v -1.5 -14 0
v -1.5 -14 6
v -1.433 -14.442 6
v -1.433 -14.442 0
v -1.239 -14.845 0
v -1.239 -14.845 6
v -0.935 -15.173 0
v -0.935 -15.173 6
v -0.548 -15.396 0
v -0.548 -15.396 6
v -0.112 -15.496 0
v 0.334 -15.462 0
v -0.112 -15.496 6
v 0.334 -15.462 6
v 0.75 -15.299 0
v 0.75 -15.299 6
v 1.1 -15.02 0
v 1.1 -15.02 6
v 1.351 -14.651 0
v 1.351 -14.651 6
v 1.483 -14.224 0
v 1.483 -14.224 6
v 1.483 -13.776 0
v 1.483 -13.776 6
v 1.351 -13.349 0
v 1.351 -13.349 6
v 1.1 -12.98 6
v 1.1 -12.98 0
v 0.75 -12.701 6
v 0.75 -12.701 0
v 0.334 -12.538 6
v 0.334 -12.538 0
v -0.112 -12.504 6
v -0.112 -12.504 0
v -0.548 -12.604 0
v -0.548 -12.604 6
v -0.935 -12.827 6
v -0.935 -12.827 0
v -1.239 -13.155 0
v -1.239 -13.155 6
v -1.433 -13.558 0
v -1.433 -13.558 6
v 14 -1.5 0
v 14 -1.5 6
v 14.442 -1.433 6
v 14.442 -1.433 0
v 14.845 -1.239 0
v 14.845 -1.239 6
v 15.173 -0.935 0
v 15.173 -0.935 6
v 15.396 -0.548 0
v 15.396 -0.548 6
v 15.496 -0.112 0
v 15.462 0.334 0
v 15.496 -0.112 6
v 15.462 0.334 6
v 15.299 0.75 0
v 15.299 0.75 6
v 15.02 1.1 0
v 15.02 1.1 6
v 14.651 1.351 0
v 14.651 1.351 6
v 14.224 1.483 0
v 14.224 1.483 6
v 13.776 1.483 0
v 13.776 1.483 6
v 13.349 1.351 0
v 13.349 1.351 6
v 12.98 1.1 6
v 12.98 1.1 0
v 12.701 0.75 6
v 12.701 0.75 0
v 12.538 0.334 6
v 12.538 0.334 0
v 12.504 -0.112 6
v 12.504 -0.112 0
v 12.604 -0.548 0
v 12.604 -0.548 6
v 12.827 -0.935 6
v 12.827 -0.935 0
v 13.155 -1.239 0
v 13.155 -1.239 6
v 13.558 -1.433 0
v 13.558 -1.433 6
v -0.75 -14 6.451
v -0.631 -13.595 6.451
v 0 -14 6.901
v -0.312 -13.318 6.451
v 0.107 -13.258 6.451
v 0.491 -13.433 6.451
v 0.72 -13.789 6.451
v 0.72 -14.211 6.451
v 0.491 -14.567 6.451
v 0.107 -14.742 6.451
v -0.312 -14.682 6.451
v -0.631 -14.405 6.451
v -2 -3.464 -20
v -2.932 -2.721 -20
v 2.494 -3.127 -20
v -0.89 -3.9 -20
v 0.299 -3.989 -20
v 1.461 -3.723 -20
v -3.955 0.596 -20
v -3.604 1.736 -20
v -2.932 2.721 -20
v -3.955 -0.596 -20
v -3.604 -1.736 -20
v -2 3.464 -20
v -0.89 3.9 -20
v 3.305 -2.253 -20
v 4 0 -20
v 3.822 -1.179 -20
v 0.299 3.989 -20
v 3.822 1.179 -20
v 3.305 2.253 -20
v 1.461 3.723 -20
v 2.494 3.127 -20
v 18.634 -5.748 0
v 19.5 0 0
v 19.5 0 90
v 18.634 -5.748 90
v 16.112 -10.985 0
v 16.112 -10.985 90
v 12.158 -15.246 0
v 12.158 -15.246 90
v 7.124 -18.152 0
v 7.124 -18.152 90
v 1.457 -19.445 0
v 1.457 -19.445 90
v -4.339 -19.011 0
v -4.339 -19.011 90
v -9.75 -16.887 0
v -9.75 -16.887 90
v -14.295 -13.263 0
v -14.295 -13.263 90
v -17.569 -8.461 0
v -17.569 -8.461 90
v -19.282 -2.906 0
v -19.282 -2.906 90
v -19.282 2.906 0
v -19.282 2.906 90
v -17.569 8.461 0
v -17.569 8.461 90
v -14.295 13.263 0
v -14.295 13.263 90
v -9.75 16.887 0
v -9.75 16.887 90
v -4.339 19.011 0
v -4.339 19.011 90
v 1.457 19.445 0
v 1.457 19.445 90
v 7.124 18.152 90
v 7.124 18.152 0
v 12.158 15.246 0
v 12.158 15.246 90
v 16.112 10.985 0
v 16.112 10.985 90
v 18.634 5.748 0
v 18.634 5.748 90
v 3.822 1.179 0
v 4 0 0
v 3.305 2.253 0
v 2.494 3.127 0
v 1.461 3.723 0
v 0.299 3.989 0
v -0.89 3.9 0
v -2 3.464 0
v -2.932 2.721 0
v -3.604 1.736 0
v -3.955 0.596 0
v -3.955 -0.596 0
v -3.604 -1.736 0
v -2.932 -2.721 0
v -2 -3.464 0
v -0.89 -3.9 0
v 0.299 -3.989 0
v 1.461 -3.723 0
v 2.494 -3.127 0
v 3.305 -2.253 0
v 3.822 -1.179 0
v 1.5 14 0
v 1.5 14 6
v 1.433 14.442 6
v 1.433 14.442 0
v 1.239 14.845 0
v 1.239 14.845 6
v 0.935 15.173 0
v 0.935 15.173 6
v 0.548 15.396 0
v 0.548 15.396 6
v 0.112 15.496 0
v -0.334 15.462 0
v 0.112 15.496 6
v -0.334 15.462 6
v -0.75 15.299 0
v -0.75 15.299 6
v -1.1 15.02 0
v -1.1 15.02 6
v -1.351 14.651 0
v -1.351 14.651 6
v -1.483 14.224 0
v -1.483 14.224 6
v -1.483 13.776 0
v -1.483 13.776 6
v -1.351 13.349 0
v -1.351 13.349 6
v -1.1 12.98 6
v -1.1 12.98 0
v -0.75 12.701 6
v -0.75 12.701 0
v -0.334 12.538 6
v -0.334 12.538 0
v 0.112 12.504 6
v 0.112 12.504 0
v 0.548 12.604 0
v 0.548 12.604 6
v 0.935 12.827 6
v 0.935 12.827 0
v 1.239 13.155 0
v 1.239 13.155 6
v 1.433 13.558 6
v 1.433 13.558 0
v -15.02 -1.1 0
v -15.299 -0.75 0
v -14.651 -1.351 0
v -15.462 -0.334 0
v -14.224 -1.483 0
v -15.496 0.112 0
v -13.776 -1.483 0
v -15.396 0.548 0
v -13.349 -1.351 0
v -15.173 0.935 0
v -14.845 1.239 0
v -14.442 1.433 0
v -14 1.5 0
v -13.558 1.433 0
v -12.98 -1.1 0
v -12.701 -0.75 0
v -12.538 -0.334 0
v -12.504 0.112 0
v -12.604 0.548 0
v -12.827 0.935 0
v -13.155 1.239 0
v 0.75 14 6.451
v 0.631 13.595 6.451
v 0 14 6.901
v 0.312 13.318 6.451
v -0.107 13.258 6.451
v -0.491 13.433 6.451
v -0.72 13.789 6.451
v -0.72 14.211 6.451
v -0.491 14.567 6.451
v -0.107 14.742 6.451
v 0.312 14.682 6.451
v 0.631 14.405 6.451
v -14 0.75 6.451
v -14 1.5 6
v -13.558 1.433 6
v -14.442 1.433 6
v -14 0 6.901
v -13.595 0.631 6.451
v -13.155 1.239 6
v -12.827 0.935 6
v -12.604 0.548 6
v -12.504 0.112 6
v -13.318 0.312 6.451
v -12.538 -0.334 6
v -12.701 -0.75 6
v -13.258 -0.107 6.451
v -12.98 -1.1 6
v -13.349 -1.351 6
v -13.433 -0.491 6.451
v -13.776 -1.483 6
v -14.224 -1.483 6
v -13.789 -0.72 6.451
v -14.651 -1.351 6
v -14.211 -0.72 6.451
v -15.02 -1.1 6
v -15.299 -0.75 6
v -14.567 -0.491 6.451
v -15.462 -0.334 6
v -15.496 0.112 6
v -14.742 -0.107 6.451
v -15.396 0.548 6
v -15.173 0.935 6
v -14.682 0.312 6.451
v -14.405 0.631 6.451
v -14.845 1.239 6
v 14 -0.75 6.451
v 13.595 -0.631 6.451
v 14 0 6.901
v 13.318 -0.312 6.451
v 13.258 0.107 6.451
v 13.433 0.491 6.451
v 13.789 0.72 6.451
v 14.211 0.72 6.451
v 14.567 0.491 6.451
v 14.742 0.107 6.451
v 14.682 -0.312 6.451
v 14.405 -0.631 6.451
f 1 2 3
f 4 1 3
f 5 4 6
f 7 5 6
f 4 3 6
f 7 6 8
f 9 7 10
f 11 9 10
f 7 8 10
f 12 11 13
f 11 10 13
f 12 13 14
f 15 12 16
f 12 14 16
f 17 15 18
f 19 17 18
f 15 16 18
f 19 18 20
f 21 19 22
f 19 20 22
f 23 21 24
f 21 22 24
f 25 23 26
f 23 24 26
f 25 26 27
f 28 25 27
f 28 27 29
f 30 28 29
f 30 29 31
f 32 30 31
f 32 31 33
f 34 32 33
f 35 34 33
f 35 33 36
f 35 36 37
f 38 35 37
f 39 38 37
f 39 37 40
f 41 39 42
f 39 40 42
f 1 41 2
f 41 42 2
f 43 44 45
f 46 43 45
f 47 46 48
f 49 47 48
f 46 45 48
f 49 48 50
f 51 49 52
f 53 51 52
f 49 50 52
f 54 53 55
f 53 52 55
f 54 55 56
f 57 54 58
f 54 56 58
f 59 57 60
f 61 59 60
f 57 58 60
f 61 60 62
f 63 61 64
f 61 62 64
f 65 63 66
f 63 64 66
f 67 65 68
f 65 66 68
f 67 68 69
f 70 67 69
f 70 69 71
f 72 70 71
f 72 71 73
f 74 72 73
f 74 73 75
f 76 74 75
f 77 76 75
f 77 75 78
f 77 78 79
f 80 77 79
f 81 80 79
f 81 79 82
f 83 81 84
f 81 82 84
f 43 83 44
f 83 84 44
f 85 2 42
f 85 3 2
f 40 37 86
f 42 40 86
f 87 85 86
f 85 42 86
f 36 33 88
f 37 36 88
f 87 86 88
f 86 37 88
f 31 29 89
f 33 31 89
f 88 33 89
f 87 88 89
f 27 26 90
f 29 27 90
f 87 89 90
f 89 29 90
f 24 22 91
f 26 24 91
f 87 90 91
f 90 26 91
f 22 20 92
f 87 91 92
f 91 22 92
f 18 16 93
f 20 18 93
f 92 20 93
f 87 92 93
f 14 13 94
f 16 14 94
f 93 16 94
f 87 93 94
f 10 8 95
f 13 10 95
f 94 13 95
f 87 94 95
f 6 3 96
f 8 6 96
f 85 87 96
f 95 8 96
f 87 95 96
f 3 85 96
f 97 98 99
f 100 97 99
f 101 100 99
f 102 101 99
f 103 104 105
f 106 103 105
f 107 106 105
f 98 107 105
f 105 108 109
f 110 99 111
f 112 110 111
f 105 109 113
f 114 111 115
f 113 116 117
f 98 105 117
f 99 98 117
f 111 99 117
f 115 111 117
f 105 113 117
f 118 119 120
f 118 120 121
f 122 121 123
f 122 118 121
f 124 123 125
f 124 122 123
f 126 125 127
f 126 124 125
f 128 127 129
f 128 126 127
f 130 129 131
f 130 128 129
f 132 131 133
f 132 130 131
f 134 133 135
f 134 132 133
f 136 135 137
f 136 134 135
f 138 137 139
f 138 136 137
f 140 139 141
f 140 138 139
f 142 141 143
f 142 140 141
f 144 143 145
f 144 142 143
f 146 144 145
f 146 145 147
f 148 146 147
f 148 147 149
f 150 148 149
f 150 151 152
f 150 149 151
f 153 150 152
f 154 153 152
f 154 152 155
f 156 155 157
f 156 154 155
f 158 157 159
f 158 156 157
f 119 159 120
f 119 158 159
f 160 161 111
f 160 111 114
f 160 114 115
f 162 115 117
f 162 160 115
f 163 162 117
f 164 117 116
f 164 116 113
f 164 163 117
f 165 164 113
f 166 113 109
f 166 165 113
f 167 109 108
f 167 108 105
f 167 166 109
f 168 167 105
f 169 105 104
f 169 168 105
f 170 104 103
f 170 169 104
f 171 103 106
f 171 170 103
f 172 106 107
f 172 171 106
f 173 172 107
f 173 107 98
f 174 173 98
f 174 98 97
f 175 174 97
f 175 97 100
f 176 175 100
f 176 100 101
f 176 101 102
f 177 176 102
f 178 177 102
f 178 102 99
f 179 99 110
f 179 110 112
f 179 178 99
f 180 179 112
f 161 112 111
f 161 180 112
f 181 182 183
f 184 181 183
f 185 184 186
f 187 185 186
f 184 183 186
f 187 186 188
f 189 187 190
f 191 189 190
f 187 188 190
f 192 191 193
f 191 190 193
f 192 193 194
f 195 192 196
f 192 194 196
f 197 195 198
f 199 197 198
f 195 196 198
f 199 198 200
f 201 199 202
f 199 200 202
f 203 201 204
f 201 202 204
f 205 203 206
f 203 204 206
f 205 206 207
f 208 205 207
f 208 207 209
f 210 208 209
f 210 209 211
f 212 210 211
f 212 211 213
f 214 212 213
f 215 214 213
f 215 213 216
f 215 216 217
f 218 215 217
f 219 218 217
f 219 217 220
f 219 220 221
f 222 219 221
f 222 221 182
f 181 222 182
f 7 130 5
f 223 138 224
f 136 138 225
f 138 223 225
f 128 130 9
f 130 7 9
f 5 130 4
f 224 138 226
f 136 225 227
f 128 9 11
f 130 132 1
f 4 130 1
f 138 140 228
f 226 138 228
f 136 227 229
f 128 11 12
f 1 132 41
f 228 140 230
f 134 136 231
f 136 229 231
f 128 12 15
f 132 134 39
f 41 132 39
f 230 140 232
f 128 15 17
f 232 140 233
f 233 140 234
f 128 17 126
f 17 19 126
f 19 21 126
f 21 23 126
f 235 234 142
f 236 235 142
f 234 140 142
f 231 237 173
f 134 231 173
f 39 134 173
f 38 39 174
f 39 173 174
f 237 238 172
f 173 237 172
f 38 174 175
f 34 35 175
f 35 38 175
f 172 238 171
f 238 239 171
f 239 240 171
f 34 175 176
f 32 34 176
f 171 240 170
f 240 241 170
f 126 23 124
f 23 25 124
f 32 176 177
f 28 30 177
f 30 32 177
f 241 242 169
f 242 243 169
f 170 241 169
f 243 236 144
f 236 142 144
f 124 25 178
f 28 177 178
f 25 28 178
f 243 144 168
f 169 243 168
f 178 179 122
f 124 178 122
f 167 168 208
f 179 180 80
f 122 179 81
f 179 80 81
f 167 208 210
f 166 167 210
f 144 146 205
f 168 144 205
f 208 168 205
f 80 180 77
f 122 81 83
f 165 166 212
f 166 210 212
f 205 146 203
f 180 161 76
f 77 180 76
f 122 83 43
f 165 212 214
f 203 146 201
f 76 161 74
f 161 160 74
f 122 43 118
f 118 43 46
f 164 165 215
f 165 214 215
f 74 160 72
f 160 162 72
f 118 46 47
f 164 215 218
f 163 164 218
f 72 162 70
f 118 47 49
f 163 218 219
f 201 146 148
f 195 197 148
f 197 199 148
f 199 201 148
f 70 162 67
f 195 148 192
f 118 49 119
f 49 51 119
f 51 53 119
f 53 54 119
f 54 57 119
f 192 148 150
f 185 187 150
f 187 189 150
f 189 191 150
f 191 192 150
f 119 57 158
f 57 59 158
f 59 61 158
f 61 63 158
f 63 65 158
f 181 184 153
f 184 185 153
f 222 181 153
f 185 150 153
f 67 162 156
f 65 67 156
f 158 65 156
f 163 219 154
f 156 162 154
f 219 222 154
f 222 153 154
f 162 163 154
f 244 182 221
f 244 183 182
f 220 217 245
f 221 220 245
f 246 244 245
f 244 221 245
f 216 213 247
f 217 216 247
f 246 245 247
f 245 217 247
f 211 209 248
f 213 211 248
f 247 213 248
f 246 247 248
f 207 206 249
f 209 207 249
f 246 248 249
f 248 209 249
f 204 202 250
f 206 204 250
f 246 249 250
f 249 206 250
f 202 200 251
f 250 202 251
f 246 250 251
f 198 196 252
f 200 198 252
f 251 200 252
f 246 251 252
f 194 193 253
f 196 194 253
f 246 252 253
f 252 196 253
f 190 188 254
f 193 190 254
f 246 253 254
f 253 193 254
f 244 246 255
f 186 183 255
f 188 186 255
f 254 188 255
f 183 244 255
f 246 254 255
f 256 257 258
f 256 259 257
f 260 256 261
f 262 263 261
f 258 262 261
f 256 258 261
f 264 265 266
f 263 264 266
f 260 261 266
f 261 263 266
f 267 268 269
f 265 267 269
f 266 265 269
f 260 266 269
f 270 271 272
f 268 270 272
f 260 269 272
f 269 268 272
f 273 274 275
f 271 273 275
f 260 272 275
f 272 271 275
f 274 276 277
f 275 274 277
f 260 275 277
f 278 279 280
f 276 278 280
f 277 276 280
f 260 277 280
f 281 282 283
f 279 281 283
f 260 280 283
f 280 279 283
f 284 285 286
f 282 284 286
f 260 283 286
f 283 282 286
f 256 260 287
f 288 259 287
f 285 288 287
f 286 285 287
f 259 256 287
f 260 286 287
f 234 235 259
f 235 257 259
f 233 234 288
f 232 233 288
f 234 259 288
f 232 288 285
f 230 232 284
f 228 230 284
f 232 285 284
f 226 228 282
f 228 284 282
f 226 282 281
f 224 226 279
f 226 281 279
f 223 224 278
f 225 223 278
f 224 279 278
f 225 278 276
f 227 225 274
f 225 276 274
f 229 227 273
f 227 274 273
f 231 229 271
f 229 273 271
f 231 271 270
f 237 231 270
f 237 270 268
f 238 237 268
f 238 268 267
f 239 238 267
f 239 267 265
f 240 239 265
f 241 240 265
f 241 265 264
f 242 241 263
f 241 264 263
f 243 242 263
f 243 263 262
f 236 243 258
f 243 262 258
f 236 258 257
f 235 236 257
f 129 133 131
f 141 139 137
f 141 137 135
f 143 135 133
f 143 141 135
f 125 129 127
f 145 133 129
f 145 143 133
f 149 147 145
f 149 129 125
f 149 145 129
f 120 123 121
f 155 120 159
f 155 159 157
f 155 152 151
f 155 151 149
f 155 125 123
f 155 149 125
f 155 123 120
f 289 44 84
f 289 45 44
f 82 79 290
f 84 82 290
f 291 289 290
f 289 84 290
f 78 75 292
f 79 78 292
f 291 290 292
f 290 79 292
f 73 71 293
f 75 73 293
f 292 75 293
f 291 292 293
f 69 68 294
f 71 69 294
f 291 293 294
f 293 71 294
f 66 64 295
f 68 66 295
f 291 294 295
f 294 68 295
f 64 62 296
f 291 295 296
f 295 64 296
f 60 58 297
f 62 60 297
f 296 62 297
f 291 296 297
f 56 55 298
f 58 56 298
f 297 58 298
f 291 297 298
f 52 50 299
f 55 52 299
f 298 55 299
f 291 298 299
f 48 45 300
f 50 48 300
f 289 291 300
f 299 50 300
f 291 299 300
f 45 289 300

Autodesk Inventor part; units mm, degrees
ref_plane "YZ Plane" through (0, 0, 0) normal (1, 0, 0) x (0, 1, 0)
ref_plane "XZ Plane" through (0, 0, 0) normal (0, 1, 0) x (-1, 0, 0)
ref_plane "XY Plane" through (0, 0, 0) normal (0, 0, 1) x (1, 0, 0)
sketch "Sketch1" plane through (0, 0, 0) normal (0, 0, 1) x (1, 0, 0)
  circle A0 centre (0, 0) radius 19.5
  circle A1 centre (0, 0) radius 4
  dimension "d0" = 39
  dimension "d3" = 8
extrude "Extrusion1" add sketch "Sketch1" along normal blind 90 contours A0 | A1
extrude "Extrusion2" add sketch "Sketch1" against normal blind 20 contours A1
sketch "Sketch2" plane through (0, 0, 0) normal (0, 0, -1) x (-1, 0, 0)
  circle A0 centre (0, 0) radius 4 projected
  circle A1 centre (0, 0) radius 19.5 projected
sketch "Sketch3" plane through (0, 0, 0) normal (0, 0, -1) x (-1, 0, 0)
  circle A0 centre (0, 0) radius 19.5 projected
  circle A1 centre (0, 0) radius 14 construction
  point P0 (14, 0)
  dimension "d6" = 28
hole "Hole1" at (-14, 0, 0) direction (0, 0, 1) diameter 3 depth 6 tip angle 118
pattern_circular "Circular Pattern1" count 4 over 360 about axis through (0, 0, 0) along (0, 0, 1) of "Hole1"
properties part number "PG36M555_Motor_Dummy"
